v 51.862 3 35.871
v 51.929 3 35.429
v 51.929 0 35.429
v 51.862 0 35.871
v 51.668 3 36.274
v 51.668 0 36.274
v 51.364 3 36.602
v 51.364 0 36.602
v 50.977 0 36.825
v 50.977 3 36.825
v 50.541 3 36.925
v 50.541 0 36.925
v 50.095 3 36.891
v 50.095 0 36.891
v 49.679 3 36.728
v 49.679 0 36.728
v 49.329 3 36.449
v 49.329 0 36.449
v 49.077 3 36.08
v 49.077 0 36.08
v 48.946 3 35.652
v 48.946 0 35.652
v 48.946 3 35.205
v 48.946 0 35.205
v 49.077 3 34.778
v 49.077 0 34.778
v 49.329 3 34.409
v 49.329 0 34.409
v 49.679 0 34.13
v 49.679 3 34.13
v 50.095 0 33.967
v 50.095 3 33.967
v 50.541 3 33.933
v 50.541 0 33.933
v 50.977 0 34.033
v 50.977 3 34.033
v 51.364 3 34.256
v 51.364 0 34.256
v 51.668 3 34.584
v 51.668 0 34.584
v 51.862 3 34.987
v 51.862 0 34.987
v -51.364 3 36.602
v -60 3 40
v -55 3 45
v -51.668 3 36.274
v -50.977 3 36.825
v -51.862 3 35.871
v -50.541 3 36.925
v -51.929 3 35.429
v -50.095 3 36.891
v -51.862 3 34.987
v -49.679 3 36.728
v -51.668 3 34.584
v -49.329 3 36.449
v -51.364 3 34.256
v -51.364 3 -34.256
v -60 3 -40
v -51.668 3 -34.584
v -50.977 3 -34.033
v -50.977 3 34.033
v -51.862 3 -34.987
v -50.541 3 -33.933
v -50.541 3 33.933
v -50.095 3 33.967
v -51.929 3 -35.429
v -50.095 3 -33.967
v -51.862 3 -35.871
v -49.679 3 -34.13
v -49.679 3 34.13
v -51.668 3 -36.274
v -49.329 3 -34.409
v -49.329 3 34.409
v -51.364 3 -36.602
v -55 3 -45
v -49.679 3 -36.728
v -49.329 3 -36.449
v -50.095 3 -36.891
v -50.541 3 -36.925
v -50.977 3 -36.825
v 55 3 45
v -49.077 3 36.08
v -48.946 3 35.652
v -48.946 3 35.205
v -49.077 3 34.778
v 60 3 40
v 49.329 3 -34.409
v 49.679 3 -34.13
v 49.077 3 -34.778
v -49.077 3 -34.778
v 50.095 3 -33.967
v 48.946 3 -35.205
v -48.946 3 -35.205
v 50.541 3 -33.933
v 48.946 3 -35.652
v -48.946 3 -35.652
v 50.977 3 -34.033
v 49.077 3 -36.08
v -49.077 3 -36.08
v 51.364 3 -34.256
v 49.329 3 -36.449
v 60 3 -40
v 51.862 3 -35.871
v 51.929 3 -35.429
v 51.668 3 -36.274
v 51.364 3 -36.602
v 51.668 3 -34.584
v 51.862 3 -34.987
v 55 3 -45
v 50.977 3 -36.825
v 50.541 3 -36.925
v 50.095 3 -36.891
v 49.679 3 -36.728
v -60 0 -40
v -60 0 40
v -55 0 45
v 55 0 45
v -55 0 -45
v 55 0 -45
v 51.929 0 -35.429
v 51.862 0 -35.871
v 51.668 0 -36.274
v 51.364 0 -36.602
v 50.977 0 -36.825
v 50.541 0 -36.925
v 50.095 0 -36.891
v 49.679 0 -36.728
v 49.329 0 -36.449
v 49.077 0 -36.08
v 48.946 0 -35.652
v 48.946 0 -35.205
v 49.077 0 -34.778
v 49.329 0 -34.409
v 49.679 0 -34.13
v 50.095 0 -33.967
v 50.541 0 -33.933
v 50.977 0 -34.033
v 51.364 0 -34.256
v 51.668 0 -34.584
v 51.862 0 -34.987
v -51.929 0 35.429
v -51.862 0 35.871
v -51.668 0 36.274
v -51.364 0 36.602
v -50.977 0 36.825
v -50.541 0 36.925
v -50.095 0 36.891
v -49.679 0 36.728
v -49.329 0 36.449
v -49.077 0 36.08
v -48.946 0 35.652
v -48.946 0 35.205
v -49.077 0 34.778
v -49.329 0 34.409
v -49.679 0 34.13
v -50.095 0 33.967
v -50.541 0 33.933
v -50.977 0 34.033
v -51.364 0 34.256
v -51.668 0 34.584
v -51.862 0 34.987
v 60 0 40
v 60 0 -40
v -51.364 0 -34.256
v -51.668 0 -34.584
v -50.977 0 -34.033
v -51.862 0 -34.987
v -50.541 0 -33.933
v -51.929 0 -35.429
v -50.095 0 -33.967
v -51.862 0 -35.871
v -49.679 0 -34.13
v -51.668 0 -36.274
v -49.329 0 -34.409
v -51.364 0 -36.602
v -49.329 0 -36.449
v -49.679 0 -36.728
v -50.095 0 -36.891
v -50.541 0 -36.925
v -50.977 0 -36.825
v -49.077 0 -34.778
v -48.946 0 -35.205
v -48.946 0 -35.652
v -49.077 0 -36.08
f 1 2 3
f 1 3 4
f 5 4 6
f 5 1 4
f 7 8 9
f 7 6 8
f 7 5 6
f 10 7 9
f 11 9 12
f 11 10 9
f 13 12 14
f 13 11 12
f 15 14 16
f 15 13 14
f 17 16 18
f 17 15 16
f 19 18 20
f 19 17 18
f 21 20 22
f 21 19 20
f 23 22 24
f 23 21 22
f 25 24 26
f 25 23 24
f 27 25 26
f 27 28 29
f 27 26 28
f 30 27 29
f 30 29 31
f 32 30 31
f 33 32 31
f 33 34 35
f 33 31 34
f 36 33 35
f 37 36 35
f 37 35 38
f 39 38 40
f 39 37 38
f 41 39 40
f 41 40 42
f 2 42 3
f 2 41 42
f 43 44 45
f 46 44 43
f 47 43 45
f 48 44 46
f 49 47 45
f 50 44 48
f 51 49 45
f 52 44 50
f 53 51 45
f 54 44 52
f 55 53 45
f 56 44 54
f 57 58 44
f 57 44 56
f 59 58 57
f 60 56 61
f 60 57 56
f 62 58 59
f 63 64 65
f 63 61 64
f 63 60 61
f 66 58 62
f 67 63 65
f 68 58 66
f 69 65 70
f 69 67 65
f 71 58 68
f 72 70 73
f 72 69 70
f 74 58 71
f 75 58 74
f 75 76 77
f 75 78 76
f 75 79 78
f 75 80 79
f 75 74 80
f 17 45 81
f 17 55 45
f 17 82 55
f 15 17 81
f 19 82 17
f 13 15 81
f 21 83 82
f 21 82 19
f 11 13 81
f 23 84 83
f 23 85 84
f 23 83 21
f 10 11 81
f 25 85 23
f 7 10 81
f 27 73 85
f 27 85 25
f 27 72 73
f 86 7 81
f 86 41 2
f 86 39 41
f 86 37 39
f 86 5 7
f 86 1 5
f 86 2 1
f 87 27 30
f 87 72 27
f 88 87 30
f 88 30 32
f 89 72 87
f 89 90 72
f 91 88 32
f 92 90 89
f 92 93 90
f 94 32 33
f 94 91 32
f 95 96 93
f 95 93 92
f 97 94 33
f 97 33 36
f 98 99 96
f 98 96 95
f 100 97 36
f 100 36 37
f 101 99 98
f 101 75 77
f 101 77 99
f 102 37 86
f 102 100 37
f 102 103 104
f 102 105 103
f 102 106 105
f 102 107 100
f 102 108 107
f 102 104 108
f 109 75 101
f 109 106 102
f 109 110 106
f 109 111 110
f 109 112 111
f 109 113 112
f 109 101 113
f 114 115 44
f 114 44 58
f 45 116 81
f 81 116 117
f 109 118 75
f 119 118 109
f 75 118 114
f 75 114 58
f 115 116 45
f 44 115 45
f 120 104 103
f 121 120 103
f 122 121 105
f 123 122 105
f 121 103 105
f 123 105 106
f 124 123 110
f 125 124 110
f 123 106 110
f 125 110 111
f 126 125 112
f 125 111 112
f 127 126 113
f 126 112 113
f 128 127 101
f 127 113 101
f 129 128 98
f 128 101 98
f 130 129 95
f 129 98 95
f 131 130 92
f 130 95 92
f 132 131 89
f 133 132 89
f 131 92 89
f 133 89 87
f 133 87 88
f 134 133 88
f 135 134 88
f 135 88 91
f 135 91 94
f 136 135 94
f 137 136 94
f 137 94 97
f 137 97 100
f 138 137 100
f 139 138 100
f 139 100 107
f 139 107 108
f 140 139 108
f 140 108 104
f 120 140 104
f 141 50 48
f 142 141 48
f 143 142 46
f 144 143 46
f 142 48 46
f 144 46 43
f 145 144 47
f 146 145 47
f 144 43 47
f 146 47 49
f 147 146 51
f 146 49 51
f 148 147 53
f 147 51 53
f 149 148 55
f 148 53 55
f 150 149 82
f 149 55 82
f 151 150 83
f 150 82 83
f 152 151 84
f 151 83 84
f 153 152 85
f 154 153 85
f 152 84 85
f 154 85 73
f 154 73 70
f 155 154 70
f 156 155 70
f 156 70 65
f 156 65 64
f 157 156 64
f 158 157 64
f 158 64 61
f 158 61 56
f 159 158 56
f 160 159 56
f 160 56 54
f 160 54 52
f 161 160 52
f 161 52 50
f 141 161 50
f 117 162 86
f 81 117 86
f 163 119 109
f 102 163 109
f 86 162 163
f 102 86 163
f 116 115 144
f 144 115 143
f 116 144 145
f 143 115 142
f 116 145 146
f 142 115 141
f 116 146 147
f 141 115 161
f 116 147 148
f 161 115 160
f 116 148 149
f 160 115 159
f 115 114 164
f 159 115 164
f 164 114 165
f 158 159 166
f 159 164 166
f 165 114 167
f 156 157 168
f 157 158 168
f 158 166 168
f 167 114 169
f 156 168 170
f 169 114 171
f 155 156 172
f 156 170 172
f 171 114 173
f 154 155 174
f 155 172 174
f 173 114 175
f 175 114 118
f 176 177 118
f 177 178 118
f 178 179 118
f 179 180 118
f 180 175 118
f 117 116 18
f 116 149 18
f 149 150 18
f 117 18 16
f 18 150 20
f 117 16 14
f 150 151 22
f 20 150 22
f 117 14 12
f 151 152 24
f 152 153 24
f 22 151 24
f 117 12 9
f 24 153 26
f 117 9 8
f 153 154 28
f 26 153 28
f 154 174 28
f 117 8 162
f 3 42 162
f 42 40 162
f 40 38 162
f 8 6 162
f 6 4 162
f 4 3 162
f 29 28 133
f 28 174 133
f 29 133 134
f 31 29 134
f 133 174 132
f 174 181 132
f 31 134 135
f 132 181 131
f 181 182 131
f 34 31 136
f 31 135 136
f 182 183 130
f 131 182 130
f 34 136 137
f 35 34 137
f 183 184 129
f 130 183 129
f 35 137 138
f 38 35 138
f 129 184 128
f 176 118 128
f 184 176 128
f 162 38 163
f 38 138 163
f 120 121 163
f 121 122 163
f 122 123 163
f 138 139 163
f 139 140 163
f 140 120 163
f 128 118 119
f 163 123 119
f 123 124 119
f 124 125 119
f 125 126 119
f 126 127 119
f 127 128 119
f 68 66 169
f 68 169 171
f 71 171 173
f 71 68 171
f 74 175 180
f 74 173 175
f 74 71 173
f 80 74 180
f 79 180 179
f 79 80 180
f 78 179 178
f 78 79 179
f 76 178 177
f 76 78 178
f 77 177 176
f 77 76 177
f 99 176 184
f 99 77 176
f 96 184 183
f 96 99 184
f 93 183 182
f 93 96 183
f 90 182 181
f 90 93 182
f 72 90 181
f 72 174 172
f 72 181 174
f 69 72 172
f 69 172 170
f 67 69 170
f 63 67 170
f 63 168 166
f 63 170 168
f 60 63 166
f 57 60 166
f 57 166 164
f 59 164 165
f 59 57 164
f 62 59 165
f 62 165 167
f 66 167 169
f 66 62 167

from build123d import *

# Parameters (mm, degrees)
SKETCH1_W                            = 120
SKETCH1_H                            = 90
BOSS_EXTRUDE1_DEPTH                  = 3
CHAMFER1_SIZE                        = 5
F_3_0_3_DIAMETER_HOLE2_D             = 3
MIRROR1_AT_THE_SECOND_PLANE_COPY_1_D = 3


with BuildPart() as part:
    # Sketch1 → Boss-Extrude1 (new body)
    with BuildSketch(Plane(origin=(0, 0, 0), x_dir=(1, 0, 0), z_dir=(0, 1, 0))):
        Rectangle(SKETCH1_W, SKETCH1_H)
    extrude(amount=BOSS_EXTRUDE1_DEPTH)

    # Chamfer1
    chamfer1_edges = [part.edges().sort_by_distance(p)[0] for p in [
        (60, 1.5, 45),
        (-60, 1.5, 45),
        (-60, 1.5, -45),
        (60, 1.5, -45),
    ]]
    chamfer(chamfer1_edges, length=CHAMFER1_SIZE)

    # Ø3.0 (3) Diameter Hole2 (through all)
    with Locations(Plane.XZ):
        with Locations((-50.428932188, 35.428932188)):
            f_3_0_3_diameter_hole2 = Hole(F_3_0_3_DIAMETER_HOLE2_D / 2)

    # Mirror1: Ø3.0 (3) Diameter Hole2 across plane
    add(f_3_0_3_diameter_hole2.mirror(Plane.XY), mode=Mode.SUBTRACT)

    # Mirror1 at the second plane: Ø3.0 (3) Diameter Hole2 across plane
    add(f_3_0_3_diameter_hole2.mirror(Plane(origin=(0, 0, 0), x_dir=(0, 0, 1), z_dir=(1, 0, 0))), mode=Mode.SUBTRACT)

    # Mirror1 at the second plane copy 1 (through all)
    with Locations(Plane(origin=(0, 0, 0), x_dir=(-1, 0, 0), z_dir=(0, -1, 0))):
        with Locations((-50.428932188, 35.428932188)):
            Hole(MIRROR1_AT_THE_SECOND_PLANE_COPY_1_D / 2)


solid = part.part
